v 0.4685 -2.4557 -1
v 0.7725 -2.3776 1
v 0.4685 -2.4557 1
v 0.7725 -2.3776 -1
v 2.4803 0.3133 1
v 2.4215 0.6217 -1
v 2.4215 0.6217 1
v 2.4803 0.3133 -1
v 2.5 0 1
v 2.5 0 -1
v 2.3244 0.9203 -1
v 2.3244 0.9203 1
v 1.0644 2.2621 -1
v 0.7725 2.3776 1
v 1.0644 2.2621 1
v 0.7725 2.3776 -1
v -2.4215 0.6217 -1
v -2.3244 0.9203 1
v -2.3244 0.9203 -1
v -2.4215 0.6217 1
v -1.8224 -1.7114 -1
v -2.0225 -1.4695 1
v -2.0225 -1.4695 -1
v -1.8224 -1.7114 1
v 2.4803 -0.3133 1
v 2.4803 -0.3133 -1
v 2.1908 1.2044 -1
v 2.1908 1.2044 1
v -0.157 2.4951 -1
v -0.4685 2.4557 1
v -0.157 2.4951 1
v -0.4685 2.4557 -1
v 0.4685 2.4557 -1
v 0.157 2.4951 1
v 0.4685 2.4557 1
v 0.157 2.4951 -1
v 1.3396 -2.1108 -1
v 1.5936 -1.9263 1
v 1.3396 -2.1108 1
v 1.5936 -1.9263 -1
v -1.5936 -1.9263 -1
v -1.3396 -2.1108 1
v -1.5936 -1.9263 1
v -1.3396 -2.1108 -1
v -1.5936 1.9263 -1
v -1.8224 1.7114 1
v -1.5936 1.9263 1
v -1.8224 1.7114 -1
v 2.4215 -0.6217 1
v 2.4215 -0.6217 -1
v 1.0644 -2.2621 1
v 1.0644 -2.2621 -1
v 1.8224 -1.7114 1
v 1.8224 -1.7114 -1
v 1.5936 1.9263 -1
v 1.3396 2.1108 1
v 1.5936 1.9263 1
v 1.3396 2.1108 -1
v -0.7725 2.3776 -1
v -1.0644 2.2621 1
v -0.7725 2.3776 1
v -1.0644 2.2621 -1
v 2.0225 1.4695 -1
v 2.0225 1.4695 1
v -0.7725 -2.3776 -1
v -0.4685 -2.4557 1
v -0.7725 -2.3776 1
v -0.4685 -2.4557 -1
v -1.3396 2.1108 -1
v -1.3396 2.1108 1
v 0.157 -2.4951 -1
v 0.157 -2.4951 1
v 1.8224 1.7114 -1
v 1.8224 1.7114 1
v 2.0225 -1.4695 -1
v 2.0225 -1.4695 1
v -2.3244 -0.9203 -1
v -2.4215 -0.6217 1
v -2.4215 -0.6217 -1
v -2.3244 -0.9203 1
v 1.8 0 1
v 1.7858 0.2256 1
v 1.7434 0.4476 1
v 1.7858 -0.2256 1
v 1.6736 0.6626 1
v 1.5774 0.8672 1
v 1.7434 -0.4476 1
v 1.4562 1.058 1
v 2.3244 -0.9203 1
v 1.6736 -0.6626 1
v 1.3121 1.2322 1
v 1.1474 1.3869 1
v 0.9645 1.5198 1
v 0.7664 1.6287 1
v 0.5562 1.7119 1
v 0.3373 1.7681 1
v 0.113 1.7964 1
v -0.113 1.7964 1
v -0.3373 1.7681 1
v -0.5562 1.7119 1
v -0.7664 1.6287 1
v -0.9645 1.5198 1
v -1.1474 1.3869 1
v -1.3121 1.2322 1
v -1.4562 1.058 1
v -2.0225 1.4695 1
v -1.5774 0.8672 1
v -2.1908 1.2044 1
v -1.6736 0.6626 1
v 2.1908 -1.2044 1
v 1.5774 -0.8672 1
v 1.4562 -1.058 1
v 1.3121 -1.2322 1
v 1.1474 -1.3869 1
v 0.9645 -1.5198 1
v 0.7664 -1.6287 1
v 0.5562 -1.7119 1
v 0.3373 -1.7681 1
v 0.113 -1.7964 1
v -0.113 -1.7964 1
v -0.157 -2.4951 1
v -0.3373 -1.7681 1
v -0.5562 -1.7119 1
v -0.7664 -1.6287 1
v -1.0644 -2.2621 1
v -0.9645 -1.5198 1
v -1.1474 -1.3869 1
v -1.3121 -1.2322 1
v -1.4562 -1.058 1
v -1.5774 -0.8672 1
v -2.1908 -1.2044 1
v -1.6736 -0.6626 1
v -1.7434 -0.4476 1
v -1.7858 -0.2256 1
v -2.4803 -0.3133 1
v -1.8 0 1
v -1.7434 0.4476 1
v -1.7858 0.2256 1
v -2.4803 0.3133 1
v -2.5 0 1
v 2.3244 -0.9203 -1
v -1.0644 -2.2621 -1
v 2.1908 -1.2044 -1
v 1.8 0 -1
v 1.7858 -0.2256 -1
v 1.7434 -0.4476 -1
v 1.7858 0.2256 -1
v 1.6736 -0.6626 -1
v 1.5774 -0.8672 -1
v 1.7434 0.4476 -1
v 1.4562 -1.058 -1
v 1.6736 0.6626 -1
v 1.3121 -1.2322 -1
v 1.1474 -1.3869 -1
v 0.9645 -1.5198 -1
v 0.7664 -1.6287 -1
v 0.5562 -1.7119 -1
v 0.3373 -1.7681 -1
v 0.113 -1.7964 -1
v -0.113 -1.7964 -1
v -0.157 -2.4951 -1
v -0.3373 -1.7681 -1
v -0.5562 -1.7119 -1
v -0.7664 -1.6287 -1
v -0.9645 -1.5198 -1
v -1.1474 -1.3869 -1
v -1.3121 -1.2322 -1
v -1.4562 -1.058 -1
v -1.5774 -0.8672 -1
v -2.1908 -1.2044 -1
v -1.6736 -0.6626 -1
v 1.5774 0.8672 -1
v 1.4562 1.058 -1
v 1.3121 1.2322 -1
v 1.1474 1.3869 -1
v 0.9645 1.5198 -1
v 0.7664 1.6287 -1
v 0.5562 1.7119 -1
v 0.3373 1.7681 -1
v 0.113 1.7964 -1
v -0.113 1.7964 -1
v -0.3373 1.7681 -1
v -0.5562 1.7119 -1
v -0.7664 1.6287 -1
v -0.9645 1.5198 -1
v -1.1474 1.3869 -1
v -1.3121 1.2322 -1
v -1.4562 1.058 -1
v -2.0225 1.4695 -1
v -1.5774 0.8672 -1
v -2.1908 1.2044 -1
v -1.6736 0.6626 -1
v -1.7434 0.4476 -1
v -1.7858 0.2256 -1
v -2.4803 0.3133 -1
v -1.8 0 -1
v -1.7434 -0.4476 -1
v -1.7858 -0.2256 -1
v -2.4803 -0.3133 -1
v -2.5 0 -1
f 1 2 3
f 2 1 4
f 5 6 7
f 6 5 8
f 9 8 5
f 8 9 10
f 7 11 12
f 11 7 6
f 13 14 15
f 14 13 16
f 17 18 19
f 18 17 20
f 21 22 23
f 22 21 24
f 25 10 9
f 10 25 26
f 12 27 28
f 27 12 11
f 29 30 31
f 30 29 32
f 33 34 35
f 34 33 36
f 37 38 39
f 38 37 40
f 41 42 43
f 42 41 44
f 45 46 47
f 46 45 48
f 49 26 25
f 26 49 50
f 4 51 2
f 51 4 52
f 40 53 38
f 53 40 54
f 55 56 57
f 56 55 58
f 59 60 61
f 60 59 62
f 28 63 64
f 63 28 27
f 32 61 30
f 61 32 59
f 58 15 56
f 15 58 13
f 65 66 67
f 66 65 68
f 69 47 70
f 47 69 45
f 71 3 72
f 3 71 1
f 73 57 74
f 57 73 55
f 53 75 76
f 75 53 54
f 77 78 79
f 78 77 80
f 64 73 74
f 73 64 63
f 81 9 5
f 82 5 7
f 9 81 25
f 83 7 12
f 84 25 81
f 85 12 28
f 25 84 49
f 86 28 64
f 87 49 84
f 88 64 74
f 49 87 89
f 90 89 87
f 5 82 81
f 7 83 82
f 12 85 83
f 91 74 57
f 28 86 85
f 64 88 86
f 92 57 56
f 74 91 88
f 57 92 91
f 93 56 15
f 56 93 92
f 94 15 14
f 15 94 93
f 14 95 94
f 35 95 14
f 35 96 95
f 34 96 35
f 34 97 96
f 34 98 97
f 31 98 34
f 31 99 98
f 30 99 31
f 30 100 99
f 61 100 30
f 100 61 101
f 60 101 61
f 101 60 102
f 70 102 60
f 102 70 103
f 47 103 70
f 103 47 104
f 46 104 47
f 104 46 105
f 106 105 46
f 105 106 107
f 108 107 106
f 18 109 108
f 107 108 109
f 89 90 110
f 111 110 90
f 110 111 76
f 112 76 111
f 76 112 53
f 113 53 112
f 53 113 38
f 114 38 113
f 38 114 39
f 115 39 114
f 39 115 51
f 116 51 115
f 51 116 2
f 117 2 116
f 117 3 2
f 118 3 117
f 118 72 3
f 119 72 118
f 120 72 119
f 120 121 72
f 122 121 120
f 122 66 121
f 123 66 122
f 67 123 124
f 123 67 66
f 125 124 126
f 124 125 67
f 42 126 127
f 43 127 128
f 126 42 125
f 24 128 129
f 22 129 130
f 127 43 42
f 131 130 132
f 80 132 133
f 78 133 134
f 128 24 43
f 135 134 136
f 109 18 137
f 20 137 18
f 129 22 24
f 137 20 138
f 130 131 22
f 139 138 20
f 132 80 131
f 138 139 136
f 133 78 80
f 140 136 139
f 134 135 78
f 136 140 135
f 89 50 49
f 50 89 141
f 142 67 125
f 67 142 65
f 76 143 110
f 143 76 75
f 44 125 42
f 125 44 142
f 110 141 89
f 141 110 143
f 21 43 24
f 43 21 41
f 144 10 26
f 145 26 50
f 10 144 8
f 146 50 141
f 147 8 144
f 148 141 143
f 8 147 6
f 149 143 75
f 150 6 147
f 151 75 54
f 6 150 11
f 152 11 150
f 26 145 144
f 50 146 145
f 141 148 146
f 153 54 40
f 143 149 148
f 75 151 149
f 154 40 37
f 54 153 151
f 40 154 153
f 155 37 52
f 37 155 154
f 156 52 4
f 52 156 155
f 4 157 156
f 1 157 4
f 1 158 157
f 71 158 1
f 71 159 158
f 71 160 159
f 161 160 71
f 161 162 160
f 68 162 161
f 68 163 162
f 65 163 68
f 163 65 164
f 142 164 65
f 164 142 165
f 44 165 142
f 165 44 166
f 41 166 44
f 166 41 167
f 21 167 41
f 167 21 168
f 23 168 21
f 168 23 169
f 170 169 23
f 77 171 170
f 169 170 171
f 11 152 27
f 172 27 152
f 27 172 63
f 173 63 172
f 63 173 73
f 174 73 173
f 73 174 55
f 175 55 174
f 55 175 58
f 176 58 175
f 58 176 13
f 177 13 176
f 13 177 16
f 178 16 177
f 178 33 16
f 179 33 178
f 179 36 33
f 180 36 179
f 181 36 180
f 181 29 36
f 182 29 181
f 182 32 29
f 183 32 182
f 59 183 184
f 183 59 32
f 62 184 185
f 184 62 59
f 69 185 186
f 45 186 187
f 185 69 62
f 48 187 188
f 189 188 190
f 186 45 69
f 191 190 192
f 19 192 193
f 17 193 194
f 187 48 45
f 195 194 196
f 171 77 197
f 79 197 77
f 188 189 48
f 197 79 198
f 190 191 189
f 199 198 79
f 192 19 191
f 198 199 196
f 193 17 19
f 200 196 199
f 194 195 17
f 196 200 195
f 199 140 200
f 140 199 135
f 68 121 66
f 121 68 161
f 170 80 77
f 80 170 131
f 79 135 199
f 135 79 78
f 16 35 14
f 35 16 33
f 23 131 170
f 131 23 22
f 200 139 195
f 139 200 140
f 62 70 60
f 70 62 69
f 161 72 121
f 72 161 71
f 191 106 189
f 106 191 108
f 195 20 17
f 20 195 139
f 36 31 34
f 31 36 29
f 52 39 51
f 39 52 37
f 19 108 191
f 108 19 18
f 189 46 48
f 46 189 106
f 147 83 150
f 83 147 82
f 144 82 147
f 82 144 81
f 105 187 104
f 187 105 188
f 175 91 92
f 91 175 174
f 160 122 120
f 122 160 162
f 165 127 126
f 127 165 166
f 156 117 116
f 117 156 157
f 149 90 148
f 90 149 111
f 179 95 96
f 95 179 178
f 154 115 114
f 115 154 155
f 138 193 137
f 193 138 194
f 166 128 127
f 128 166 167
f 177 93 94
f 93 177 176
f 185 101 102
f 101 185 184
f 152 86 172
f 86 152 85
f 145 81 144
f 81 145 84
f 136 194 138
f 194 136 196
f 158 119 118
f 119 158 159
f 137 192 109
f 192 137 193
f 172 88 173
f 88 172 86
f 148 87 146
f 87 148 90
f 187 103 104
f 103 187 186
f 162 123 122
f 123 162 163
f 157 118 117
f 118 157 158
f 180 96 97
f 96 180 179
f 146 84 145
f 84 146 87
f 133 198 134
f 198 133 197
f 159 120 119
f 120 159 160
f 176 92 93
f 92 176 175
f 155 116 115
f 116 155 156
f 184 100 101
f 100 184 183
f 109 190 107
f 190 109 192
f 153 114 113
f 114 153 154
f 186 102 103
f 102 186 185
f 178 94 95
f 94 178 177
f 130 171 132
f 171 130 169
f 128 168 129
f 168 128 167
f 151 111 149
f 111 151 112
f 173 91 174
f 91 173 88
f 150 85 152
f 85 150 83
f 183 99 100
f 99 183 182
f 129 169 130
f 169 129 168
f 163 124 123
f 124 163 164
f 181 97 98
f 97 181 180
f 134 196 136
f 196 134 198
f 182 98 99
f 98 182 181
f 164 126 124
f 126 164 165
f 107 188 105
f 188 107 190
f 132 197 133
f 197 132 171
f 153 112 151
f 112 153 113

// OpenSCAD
$fn = 50;


difference() {
	union() {
		translate(v = [0, 0, -1.0000000000]) {
			cylinder(h = 2, r = 2.5000000000);
		}
	}
	union() {
		#translate(v = [0, 0, -100.0000000000]) {
			cylinder(h = 200, r = 1.8000000000);
		}
	}
}
